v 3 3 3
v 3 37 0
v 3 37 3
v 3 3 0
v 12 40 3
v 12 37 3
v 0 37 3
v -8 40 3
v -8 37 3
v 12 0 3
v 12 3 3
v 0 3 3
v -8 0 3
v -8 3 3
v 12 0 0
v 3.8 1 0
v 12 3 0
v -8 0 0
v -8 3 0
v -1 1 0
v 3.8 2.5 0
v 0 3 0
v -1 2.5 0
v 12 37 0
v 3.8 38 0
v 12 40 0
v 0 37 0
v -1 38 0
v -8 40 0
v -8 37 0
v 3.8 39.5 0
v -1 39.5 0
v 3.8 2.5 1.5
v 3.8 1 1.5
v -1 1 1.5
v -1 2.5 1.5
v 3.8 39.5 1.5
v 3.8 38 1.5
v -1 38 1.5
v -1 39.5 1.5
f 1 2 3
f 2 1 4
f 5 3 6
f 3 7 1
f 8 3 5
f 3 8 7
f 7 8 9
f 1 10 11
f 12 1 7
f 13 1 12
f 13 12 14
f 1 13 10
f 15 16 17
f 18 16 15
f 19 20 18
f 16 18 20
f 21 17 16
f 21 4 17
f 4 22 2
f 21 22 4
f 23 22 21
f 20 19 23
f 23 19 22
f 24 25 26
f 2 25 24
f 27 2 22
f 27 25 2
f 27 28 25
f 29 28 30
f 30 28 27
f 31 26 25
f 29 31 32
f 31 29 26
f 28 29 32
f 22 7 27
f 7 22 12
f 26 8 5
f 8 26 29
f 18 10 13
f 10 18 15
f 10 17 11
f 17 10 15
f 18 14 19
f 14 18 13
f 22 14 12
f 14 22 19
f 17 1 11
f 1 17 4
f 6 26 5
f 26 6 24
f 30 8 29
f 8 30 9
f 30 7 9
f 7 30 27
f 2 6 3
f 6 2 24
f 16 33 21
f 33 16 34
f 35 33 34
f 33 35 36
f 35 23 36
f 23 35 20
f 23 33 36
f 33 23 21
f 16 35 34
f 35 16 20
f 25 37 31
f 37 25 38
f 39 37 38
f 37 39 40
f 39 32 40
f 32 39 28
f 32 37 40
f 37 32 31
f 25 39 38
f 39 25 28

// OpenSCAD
difference(){
union(){ 
 cube([3,40,3]);
  translate([-8,0,0]) cube([20,3,3]);
  translate([-8,37,0]) cube([20,3,3]);
}
translate([-1,1,0]) cube([4.8,1.5,1.5]);
translate([-1,38,0]) cube([4.8,1.5,1.5]);
}
